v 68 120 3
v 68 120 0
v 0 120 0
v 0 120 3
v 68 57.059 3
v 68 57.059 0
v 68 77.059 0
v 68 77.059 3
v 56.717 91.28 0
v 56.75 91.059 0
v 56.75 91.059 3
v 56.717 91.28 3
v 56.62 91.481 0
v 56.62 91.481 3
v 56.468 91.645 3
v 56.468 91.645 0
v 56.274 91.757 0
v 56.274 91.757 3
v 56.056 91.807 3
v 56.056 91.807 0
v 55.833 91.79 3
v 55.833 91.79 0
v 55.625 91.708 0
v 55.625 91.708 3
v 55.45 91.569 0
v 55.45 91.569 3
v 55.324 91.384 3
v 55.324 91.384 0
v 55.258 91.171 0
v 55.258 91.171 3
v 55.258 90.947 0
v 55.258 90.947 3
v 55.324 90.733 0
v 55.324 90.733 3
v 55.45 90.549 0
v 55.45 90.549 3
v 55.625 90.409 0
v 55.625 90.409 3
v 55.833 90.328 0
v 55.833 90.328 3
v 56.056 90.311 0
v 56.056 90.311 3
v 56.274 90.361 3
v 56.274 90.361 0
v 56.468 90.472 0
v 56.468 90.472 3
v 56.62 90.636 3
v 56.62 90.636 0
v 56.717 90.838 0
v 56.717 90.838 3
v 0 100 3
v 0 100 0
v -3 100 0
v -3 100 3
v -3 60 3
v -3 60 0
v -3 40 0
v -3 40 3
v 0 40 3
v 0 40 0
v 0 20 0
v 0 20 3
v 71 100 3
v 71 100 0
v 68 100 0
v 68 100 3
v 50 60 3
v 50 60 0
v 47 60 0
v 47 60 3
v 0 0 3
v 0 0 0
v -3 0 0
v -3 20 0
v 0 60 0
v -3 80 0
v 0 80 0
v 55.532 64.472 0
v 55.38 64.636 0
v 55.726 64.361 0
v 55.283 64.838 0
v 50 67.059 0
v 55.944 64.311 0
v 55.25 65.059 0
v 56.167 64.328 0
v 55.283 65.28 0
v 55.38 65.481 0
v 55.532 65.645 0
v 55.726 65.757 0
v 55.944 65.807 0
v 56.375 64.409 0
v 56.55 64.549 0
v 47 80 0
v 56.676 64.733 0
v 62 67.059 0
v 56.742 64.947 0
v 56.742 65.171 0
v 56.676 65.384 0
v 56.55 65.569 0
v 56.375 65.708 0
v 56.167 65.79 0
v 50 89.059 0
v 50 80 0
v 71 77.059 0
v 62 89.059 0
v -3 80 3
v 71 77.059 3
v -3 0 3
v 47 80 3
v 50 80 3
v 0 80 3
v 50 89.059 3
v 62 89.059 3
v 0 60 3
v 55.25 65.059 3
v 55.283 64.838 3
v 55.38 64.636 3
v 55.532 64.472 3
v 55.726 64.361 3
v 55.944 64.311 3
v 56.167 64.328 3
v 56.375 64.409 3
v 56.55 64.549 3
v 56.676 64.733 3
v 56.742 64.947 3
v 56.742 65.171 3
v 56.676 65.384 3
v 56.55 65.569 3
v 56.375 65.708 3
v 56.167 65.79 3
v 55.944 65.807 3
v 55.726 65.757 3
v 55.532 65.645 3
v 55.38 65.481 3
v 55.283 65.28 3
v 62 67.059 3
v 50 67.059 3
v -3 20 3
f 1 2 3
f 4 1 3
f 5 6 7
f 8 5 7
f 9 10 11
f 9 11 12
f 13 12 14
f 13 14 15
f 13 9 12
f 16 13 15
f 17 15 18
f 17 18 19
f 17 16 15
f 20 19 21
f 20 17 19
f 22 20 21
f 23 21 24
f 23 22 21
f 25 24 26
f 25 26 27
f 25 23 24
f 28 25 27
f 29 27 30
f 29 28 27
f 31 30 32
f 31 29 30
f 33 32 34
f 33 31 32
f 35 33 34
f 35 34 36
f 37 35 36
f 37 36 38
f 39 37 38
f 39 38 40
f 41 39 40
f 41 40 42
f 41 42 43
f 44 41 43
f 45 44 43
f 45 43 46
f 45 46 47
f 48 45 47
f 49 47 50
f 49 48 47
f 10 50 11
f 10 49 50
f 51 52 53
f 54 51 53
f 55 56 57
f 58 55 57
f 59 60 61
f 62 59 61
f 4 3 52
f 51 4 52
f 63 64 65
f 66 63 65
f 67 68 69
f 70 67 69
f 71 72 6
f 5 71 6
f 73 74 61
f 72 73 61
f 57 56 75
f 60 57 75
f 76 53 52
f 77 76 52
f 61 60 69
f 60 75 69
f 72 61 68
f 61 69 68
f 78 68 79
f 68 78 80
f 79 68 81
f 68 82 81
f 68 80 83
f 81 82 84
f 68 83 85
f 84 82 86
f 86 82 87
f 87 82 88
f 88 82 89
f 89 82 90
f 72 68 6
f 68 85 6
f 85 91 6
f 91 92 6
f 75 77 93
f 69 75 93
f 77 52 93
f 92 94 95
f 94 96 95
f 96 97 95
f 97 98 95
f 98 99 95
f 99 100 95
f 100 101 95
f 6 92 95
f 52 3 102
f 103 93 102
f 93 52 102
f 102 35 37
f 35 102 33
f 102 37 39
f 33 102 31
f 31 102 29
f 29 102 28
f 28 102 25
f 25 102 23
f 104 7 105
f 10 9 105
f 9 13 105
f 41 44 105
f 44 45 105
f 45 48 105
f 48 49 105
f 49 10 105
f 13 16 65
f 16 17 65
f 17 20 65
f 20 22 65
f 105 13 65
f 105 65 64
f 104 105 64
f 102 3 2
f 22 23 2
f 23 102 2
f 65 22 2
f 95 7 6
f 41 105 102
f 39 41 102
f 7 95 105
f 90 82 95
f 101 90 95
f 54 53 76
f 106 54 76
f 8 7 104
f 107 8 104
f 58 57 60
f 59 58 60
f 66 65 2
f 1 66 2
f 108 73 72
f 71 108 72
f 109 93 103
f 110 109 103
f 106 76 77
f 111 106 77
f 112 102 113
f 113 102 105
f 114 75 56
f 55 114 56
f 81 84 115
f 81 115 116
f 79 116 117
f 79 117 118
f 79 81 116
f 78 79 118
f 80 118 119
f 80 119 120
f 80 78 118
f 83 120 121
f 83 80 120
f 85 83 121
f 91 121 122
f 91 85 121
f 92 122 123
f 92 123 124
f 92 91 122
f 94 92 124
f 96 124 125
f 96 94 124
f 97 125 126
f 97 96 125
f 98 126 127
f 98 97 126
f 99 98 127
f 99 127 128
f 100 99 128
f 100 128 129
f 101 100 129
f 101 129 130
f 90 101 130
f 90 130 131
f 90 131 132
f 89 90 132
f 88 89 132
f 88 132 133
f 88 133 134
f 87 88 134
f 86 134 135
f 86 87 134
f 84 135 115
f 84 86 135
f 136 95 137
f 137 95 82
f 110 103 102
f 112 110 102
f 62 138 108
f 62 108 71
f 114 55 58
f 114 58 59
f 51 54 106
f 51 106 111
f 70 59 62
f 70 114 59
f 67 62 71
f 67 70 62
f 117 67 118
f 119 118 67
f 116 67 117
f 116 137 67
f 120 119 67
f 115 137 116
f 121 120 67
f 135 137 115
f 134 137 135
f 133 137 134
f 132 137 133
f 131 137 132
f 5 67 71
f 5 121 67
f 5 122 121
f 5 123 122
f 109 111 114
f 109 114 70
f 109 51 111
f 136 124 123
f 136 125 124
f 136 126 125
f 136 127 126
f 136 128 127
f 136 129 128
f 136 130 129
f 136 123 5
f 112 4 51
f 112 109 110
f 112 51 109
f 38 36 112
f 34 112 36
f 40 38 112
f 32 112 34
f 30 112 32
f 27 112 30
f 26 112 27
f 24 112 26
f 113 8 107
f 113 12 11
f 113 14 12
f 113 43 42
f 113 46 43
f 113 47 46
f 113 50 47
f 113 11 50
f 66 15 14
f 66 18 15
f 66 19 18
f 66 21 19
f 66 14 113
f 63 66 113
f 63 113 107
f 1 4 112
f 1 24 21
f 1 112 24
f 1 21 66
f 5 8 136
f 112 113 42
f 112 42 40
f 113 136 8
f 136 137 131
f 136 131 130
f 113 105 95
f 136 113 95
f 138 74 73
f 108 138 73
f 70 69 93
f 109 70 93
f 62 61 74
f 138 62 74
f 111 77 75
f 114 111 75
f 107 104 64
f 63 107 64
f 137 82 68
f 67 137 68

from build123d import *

# Parameters (mm, degrees)
SKETCH1_R           = 0.75
BOSS_EXTRUDE1_DEPTH = 3


with BuildPart() as part:
    # Sketch1 → Boss-Extrude1 (new body)
    with BuildSketch(Plane.XY):
        Polygon((-3, 60), (-3, 40), (0, 40), (0, 20), (-3, 20), (-3, 0), (0, 0), (68, 57.05877492), (68, 77.05877492), (71, 77.05877492), (71, 100), (68, 100), (68, 120), (23.5, 120), (0, 120), (0, 100), (-3, 100), (-3, 80), (0, 80), (0, 60), align=None)
        with Locations((56, 91.05877492)):
            Circle(SKETCH1_R, mode=Mode.SUBTRACT)
        with Locations(Location((56, 65.05877492, 0), (0, 0, 180))):
            Circle(SKETCH1_R, mode=Mode.SUBTRACT)
        Polygon((47, 80), (50, 80), (50, 89.05877492), (62, 89.05877492), (62, 67.05877492), (50, 67.05877492), (50, 60), (47, 60), align=None, mode=Mode.SUBTRACT)
    extrude(amount=BOSS_EXTRUDE1_DEPTH)


solid = part.part
